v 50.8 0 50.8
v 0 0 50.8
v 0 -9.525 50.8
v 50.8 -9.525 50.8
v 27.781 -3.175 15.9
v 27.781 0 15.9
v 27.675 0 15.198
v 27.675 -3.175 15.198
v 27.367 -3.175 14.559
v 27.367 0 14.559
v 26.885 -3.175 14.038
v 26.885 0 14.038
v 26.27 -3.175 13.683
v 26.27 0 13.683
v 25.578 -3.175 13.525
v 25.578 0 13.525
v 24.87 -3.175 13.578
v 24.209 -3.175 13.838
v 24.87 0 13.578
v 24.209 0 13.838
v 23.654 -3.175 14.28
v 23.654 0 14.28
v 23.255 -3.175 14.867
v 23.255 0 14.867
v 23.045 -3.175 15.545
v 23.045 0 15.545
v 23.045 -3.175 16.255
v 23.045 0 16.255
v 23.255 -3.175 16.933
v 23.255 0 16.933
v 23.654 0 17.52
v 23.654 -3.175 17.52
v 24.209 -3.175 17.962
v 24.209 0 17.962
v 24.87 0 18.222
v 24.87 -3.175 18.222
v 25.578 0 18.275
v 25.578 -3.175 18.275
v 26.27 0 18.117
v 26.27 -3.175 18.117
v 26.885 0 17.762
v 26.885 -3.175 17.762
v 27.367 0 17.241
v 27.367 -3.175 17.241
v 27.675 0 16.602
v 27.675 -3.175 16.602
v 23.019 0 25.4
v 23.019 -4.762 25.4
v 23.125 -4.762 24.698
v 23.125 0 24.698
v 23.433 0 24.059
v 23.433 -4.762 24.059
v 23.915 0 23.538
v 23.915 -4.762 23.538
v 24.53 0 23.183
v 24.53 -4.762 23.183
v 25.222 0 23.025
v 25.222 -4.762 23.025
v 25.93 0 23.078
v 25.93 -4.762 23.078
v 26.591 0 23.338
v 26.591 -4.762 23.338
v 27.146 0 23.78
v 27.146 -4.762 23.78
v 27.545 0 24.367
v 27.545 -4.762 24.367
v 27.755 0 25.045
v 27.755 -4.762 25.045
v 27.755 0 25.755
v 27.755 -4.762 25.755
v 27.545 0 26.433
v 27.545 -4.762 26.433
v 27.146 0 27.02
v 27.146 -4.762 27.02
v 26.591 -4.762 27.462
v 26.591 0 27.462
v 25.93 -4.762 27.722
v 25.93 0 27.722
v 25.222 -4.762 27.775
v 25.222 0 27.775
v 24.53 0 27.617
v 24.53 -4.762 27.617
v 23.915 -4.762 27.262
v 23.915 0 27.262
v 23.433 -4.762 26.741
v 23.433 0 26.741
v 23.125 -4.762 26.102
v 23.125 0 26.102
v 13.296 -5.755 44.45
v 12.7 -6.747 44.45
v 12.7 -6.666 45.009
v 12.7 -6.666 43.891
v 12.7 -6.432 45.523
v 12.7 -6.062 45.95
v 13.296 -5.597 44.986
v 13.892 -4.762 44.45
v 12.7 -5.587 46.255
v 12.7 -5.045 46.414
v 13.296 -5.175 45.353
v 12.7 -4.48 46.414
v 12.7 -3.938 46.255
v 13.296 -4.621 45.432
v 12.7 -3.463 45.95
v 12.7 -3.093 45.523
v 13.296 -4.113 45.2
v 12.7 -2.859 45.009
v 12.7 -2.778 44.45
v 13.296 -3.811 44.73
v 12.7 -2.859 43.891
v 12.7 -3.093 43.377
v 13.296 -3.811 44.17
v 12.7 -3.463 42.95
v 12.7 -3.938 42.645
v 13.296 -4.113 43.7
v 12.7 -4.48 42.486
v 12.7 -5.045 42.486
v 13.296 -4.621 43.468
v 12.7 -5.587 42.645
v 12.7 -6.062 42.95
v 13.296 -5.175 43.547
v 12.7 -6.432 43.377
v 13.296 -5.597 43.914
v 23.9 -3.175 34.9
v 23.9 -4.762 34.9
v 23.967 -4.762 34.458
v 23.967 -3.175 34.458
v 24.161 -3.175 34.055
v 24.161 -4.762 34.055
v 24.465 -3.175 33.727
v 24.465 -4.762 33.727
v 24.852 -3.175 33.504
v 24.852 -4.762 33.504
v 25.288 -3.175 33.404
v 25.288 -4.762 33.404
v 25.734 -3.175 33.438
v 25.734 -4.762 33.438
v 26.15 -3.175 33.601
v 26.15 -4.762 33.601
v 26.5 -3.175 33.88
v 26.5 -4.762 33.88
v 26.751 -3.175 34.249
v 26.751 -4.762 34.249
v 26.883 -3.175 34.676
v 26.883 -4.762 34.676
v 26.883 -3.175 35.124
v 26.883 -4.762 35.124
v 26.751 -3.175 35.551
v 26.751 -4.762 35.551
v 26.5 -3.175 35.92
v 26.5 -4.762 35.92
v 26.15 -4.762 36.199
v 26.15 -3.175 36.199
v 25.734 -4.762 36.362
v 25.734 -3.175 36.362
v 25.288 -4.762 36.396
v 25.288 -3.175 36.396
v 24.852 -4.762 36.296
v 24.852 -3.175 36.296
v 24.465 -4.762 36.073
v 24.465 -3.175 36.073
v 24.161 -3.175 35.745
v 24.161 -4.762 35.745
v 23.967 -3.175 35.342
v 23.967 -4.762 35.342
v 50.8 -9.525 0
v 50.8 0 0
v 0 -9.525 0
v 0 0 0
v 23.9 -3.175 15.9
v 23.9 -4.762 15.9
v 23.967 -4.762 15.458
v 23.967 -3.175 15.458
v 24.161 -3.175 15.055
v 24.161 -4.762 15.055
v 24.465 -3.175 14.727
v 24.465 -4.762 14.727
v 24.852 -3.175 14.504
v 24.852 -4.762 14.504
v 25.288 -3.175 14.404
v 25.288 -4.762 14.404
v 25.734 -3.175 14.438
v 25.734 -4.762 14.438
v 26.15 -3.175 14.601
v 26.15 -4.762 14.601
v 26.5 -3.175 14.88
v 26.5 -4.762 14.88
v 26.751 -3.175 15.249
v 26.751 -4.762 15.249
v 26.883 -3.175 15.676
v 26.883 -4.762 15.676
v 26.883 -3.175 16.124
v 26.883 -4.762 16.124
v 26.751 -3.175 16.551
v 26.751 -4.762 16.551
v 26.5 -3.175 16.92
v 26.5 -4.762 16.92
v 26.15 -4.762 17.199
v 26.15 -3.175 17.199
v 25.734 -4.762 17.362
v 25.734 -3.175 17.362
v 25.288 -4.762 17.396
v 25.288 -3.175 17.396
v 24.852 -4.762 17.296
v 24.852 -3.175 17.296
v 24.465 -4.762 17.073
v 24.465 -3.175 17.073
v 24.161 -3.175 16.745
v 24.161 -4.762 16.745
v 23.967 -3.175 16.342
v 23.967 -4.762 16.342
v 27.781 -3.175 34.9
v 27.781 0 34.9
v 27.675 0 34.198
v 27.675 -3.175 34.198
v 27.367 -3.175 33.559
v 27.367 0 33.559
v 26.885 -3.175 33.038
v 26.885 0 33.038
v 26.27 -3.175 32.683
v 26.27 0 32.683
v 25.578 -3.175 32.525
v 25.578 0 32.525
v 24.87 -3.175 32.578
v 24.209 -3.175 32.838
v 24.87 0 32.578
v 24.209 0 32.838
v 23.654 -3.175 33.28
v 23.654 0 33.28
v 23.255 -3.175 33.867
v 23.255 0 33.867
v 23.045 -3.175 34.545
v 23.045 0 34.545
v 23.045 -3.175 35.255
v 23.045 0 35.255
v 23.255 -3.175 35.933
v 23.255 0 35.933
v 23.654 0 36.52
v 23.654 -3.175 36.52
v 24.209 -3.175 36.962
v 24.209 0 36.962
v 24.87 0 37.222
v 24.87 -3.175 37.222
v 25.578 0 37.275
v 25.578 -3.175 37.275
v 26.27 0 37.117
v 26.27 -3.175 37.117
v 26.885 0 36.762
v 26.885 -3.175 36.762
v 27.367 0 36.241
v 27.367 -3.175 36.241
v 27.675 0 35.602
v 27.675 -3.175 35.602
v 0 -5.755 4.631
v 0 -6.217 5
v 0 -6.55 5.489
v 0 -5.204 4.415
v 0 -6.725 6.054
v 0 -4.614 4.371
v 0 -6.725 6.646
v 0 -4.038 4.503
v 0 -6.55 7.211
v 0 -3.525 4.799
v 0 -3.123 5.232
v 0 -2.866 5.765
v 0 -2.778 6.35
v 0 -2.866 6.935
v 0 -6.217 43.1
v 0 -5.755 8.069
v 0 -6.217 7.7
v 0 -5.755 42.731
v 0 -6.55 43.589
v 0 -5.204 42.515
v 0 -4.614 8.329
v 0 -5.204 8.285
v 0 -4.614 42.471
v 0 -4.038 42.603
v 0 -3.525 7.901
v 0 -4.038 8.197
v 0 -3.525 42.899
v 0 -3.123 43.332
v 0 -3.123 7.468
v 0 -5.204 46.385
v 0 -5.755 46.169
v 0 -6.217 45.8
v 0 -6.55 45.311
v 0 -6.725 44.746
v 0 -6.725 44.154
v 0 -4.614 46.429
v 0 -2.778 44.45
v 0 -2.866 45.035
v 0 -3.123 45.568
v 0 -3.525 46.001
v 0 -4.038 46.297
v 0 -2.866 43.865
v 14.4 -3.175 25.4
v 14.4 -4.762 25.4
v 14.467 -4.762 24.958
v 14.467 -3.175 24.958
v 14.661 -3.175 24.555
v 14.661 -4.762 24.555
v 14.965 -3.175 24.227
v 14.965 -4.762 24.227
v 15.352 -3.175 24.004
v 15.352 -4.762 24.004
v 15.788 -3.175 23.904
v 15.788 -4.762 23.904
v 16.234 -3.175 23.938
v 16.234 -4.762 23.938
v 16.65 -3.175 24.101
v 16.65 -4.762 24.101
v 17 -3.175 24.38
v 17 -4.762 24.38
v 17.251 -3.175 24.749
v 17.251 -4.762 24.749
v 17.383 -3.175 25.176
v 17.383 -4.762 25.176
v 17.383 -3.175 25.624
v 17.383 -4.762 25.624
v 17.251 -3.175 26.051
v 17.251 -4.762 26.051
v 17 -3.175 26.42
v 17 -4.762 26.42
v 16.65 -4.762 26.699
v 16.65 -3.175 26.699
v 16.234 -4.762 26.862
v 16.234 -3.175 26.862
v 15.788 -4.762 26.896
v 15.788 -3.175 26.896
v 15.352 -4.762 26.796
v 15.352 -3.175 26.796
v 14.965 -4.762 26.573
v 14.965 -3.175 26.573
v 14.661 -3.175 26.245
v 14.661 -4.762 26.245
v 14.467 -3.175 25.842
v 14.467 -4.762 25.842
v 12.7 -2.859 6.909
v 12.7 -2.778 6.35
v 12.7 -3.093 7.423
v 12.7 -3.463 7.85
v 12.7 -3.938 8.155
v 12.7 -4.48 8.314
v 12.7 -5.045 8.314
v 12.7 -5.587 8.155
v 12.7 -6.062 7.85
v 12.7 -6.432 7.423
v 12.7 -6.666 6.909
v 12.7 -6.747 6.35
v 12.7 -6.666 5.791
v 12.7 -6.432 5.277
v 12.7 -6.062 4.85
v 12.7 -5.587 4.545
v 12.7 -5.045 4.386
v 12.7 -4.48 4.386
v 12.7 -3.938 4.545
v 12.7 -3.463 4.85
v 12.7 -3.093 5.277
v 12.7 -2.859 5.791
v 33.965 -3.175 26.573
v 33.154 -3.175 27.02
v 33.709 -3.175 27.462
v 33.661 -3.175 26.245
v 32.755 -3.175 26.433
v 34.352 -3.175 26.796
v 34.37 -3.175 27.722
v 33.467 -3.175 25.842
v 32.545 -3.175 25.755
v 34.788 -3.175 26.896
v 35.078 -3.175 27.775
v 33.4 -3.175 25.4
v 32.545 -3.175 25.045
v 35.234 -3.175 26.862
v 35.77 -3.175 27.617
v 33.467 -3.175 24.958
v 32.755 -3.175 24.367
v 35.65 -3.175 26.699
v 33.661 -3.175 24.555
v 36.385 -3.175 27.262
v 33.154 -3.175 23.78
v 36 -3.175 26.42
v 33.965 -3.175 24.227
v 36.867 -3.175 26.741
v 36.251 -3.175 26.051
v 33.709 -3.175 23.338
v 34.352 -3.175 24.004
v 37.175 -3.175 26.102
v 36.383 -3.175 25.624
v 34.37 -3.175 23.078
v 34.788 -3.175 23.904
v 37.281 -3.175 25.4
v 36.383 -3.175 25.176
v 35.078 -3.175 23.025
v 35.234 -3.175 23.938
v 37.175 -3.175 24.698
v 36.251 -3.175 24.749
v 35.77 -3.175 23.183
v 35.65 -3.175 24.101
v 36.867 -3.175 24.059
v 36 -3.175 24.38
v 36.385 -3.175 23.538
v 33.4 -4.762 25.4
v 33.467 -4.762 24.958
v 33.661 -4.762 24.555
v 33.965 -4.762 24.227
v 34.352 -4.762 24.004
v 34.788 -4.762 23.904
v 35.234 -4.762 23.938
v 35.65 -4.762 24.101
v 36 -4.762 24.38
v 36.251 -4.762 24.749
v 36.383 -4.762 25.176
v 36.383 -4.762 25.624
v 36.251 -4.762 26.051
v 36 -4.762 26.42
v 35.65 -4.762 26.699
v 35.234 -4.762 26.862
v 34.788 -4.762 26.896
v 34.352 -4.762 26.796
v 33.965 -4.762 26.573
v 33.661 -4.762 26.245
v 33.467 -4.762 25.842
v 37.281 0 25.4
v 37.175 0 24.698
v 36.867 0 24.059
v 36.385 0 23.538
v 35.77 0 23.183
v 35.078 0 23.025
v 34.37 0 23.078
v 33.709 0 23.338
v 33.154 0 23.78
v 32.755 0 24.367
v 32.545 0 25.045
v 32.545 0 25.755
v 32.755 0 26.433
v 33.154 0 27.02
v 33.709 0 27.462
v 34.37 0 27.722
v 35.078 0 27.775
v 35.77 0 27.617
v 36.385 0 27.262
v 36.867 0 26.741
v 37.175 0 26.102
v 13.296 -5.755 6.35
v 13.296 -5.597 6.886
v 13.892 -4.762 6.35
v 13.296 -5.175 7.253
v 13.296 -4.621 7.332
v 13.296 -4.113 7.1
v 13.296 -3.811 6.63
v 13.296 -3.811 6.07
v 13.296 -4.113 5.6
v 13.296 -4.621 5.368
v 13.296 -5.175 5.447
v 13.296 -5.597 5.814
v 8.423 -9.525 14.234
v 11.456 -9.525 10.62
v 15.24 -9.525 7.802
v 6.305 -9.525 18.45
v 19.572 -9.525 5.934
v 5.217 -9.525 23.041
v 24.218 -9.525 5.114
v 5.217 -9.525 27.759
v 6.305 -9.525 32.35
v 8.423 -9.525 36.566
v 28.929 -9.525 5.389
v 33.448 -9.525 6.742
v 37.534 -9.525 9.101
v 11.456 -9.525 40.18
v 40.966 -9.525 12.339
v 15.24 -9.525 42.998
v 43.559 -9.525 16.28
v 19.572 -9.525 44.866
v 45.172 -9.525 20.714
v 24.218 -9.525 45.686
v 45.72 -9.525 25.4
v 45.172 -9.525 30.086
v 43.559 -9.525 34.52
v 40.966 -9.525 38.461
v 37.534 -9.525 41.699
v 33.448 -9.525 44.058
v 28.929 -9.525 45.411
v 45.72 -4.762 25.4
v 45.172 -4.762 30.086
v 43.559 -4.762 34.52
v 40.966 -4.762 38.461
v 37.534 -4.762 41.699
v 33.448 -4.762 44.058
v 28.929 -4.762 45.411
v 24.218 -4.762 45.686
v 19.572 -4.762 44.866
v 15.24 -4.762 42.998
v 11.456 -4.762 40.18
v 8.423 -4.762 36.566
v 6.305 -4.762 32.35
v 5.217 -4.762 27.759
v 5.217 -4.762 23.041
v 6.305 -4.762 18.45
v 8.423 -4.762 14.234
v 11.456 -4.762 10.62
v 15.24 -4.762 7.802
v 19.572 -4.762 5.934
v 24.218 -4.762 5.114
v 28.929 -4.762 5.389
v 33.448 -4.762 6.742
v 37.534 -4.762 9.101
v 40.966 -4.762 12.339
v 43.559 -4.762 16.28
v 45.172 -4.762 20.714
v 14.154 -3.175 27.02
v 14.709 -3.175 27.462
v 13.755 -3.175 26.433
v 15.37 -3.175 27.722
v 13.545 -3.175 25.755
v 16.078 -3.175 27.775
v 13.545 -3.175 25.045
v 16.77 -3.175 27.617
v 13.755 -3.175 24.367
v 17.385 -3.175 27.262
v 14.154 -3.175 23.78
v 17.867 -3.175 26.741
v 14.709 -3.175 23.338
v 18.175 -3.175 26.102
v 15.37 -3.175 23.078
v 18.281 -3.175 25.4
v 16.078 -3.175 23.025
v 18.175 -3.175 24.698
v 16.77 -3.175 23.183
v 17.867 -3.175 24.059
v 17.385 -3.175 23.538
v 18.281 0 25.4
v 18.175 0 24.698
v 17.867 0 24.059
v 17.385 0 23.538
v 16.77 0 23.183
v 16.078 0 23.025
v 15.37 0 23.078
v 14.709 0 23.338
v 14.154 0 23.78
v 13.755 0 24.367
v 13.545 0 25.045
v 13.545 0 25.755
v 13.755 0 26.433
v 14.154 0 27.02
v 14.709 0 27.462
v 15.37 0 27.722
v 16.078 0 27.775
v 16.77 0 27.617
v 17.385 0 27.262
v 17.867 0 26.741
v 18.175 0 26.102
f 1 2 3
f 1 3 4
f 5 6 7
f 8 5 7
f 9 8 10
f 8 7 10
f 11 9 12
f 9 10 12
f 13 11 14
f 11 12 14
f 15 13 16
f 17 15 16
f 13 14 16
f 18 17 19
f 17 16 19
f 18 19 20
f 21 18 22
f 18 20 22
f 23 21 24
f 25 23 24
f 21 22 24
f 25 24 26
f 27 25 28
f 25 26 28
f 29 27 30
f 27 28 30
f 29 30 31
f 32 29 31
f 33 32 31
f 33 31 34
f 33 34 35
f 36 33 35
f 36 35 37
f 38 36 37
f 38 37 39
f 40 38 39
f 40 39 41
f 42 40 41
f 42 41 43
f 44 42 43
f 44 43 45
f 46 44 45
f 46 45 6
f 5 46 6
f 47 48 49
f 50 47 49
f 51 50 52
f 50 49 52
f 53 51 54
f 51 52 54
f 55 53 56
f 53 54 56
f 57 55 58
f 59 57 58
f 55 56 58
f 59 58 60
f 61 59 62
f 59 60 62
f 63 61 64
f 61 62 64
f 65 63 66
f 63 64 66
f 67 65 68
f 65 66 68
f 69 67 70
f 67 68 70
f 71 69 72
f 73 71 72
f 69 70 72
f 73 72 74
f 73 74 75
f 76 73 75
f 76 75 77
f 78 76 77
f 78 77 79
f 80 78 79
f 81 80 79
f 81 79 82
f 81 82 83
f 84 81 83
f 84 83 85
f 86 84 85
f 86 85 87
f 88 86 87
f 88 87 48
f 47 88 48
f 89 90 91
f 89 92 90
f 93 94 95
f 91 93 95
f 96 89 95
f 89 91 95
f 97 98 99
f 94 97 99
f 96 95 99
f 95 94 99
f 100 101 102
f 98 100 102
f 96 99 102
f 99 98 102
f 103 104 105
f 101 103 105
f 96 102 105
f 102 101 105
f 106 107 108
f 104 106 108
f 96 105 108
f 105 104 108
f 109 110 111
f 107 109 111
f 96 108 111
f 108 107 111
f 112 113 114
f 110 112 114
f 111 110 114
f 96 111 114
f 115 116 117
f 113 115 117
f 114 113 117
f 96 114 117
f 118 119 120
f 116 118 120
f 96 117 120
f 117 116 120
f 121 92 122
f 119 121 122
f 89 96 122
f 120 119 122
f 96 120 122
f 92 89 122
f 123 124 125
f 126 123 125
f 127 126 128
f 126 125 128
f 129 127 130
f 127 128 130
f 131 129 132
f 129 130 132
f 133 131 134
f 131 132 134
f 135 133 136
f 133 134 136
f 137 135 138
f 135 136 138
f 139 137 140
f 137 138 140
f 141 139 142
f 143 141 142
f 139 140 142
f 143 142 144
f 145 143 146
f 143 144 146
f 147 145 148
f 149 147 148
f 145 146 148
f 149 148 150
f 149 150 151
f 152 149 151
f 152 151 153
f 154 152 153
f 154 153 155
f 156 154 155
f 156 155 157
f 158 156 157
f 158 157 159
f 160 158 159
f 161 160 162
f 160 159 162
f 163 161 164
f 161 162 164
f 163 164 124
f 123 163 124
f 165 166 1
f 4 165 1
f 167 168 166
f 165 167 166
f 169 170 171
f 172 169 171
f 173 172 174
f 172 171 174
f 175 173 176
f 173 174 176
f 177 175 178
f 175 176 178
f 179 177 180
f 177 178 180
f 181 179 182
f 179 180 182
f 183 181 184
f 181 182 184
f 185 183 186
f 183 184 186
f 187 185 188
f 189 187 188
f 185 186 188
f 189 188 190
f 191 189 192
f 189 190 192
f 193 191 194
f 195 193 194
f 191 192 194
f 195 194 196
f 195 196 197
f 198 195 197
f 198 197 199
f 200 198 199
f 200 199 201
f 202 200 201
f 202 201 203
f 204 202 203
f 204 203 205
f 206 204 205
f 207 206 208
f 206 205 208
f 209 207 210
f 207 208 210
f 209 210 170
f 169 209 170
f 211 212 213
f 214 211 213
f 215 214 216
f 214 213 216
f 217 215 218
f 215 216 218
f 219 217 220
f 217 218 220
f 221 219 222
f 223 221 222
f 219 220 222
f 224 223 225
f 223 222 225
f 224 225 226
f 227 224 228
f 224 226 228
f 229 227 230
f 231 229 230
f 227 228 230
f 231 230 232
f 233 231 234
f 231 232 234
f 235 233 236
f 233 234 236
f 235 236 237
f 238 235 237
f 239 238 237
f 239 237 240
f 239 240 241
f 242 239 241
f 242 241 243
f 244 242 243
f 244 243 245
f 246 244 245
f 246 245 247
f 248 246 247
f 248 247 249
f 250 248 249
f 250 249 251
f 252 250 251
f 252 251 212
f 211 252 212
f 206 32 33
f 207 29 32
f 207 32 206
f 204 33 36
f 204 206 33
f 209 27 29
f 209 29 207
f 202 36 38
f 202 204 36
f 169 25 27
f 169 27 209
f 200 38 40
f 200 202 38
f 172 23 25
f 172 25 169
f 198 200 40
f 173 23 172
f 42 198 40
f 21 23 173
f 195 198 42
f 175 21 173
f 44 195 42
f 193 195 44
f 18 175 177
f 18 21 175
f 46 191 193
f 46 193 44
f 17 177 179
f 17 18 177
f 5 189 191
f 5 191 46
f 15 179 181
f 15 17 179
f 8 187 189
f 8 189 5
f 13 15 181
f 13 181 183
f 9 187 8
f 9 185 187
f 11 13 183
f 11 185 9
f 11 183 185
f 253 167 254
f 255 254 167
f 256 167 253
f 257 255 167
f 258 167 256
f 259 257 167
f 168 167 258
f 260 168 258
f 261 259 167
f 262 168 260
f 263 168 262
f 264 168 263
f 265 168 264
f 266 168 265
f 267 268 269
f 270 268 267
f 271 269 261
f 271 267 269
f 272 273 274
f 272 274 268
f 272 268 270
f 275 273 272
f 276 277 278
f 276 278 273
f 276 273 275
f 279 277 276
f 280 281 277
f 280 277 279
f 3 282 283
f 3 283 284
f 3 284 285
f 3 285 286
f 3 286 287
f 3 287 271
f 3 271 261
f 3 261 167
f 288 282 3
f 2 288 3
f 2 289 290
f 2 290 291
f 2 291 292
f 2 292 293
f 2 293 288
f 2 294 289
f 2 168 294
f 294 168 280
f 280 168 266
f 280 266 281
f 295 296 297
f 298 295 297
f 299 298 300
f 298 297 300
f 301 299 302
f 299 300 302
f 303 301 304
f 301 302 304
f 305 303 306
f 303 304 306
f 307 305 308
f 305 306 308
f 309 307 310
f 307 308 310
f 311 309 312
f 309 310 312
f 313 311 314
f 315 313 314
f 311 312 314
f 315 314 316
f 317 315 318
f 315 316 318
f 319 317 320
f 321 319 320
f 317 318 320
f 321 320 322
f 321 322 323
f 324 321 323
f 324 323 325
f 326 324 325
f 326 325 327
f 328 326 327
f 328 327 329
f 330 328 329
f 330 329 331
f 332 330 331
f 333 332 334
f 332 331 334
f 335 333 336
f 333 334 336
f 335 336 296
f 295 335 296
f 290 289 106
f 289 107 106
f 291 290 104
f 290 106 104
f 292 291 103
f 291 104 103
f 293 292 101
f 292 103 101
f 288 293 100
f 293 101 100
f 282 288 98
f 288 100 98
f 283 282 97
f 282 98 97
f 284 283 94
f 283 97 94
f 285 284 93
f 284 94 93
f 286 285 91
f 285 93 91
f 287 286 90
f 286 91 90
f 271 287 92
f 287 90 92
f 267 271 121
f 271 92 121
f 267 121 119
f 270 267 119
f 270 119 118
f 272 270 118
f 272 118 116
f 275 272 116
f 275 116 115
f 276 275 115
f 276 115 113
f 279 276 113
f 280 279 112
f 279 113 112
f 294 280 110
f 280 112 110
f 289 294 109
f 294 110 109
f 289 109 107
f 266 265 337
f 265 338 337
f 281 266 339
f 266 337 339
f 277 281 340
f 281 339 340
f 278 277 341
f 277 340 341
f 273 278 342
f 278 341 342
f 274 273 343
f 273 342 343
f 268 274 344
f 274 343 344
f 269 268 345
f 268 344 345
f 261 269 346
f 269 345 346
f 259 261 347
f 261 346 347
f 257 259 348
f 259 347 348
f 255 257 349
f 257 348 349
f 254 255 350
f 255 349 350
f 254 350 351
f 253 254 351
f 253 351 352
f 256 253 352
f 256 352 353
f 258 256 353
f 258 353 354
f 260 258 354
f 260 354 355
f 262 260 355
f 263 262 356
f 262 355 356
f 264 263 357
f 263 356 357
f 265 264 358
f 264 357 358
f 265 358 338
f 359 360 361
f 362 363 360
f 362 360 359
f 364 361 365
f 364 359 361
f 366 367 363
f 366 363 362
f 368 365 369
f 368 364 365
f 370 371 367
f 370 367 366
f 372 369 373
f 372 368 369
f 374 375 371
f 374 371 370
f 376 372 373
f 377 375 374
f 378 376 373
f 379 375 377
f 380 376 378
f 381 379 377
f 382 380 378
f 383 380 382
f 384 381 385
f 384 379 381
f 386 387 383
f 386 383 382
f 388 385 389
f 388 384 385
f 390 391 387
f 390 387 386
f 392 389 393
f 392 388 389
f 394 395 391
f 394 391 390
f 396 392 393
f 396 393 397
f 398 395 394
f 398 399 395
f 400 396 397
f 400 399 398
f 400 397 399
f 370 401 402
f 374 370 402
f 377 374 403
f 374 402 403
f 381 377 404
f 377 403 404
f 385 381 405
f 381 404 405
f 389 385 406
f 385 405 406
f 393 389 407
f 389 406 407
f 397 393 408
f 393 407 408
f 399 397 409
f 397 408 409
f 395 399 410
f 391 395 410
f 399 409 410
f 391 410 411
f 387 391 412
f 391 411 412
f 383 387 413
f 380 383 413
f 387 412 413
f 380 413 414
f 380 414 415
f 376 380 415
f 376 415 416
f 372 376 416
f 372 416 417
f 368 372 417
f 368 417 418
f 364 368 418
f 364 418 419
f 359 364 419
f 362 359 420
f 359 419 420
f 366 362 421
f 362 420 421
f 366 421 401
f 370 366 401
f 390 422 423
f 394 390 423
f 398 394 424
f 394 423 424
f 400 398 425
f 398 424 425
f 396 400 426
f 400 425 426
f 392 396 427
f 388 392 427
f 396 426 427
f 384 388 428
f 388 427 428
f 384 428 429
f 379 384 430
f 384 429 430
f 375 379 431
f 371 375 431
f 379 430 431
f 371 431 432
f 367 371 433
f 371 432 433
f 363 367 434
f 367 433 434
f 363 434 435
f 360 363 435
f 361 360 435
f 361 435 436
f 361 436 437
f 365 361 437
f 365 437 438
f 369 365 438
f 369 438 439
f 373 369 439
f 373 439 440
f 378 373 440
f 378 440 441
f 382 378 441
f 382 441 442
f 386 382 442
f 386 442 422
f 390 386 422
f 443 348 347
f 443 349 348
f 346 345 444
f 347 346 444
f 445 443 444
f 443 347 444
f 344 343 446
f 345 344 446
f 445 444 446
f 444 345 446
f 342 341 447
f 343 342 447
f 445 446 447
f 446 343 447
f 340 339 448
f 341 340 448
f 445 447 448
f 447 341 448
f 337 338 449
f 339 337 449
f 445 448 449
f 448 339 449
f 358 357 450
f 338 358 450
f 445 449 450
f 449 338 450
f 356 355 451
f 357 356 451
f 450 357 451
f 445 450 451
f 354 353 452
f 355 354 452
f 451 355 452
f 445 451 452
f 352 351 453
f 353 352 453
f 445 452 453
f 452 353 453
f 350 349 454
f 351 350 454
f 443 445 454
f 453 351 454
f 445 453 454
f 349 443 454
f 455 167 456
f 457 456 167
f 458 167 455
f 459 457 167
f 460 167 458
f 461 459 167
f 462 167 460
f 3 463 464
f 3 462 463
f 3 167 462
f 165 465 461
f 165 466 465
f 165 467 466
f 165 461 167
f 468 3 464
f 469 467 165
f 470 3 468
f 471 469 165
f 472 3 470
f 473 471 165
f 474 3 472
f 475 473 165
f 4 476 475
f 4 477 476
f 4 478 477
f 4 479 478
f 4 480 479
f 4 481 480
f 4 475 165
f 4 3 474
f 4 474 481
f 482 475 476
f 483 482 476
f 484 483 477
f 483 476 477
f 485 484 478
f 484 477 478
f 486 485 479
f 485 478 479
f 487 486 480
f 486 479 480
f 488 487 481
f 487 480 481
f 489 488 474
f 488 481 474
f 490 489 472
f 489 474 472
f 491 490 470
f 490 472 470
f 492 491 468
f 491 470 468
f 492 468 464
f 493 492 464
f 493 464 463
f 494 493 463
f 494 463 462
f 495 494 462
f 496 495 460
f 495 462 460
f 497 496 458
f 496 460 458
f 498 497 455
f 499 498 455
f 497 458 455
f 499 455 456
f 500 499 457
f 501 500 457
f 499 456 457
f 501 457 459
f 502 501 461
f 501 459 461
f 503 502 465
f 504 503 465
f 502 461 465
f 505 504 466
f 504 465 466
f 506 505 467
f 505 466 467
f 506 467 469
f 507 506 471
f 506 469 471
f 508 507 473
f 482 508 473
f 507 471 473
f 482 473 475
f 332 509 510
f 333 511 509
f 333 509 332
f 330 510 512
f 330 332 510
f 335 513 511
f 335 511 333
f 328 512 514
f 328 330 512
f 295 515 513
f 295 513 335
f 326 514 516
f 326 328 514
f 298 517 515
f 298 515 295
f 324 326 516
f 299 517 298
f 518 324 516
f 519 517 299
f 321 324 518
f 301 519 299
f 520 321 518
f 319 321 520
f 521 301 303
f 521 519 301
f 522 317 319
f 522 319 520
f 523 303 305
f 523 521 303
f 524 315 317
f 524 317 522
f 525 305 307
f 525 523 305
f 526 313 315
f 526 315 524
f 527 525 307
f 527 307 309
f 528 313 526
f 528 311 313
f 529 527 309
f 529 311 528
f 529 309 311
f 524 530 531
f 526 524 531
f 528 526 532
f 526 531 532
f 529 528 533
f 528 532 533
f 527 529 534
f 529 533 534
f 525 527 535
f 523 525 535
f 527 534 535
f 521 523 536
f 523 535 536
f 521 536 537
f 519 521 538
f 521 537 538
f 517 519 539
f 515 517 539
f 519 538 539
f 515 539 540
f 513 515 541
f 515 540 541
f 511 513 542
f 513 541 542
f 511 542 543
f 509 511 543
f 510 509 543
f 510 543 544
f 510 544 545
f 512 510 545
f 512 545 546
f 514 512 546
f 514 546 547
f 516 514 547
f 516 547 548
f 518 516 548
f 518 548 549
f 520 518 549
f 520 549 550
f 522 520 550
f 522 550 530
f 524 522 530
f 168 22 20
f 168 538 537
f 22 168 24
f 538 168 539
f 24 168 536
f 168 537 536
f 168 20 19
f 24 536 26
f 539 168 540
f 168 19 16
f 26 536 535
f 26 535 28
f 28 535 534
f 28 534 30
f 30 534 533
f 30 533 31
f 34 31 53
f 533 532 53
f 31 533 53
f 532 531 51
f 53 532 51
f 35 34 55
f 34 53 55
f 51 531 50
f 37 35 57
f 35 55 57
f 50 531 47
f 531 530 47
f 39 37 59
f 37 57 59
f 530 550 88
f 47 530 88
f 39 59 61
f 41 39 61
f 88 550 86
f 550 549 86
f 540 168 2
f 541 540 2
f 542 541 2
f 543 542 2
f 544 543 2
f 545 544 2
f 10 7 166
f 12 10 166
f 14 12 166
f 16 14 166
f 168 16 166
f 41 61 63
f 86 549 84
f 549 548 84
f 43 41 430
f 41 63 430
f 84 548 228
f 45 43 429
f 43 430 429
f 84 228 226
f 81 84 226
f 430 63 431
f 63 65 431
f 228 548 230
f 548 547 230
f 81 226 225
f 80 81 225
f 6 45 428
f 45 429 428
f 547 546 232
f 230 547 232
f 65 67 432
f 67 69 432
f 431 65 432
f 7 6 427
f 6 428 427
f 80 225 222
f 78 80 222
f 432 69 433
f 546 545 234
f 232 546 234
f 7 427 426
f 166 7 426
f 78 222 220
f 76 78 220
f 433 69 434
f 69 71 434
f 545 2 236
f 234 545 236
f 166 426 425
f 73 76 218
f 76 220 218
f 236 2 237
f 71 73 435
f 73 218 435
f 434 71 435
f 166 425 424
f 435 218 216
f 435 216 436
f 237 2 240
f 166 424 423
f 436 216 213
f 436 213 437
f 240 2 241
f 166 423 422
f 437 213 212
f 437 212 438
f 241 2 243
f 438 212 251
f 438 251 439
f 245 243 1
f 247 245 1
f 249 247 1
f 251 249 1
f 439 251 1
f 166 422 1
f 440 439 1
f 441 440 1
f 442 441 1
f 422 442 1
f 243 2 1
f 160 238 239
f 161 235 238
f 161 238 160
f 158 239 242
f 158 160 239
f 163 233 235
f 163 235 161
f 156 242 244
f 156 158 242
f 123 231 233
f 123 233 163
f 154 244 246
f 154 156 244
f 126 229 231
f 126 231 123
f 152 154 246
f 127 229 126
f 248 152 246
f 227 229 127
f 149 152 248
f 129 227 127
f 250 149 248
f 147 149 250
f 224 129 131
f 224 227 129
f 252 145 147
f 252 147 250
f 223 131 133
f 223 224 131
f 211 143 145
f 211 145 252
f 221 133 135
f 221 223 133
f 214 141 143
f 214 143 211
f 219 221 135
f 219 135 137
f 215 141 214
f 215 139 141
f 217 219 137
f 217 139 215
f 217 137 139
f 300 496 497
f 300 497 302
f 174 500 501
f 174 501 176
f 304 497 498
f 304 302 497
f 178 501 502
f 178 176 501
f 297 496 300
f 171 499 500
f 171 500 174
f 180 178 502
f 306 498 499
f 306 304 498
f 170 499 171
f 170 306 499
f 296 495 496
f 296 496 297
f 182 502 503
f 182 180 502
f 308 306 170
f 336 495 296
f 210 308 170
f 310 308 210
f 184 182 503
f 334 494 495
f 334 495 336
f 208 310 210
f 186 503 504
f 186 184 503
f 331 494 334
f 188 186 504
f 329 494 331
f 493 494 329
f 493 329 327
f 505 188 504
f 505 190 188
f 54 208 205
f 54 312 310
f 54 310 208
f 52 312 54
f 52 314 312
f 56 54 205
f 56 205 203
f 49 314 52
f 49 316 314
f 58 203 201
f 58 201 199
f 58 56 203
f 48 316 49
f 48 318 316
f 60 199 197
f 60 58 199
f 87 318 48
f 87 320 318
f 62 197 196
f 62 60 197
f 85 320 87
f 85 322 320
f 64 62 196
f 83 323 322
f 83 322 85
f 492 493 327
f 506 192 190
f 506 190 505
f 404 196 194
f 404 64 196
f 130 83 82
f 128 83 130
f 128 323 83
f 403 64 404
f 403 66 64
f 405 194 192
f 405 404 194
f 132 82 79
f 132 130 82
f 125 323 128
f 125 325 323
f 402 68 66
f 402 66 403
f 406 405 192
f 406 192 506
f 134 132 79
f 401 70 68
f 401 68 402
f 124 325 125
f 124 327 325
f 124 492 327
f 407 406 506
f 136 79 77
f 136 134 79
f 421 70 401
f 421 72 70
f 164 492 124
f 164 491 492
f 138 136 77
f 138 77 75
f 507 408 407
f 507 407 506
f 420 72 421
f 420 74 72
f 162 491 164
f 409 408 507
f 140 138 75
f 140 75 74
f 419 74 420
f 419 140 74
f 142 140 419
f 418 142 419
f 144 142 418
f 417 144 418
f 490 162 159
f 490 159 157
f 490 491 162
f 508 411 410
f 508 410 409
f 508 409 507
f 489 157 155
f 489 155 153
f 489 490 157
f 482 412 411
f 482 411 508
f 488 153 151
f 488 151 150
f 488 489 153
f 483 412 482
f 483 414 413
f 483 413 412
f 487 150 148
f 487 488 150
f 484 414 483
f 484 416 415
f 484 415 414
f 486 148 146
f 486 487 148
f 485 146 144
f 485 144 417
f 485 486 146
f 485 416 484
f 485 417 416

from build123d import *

# Parameters (mm, degrees)
F0_W           = 50.8
F0_H           = 50.8
F1_DEPTH       = 9.525
F3_D           = 3.96875
F3_DEPTH       = 12.7
F3_TIP         = 1.1923327909
F4_D           = 3
F4_CBORE_D     = 4.7625
F4_CBORE_DEPTH = 3.175
F5_D           = 4.7625
F5_DEPTH       = 12.7
F5_TIP         = 1.4307993491
F6_R           = 20.32
F6_R_2         = 1.5
F6_R_3         = 2.38125
F7_DEPTH       = 4.7625


with BuildPart() as f1:
    # F0 (on Front) → F1 (new body)
    with BuildSketch(Plane.XZ):
        with Locations((25.4, 25.4)):
            Rectangle(F0_W, F0_H)
    extrude(amount=F1_DEPTH)

    # F3
    with Locations(Plane(origin=(0, 0, 0), x_dir=(0, -1, 0), z_dir=(-1, 0, 0))):
        with Locations((4.7625, 44.45), (4.7625, 6.35)):
            Hole(F3_D / 2, depth=F3_DEPTH)
            with Locations((0, 0, -(F3_DEPTH + F3_TIP / 2))):  # 118° drill point
                Cone(0, F3_D / 2, F3_TIP, mode=Mode.SUBTRACT)

    # F4 (through all)
    with Locations(Plane(origin=(0, 0, 0), x_dir=(1, 0, 0), z_dir=(0, 1, 0))):
        with Locations((25.4, -34.9), (15.9, -25.4), (25.4, -15.9), (34.9, -25.4)):
            CounterBoreHole(F4_D / 2, F4_CBORE_D / 2, F4_CBORE_DEPTH)

    # F5
    with Locations(Plane(origin=(0, 0, 0), x_dir=(1, 0, 0), z_dir=(0, 1, 0))):
        with Locations((25.4, -25.4)):
            Hole(F5_D / 2, depth=F5_DEPTH)
            with Locations((0, 0, -(F5_DEPTH + F5_TIP / 2))):  # 118° drill point
                Cone(0, F5_D / 2, F5_TIP, mode=Mode.SUBTRACT)

    # F6 (on face) → F7 (cut)
    with BuildSketch(Plane.XZ.offset(9.525)):
        with Locations((25.4, 25.4)):
            Circle(F6_R)
        with Locations((25.4, 15.9)):
            Circle(F6_R_2, mode=Mode.SUBTRACT)
        with Locations((15.9, 25.4)):
            Circle(F6_R_2, mode=Mode.SUBTRACT)
        with Locations((25.4, 25.4)):
            Circle(F6_R_3, mode=Mode.SUBTRACT)
        with Locations((34.9, 25.4)):
            Circle(F6_R_2, mode=Mode.SUBTRACT)
        with Locations((25.4, 34.9)):
            Circle(F6_R_2, mode=Mode.SUBTRACT)
    extrude(amount=-F7_DEPTH, mode=Mode.SUBTRACT)


solid = f1.part
